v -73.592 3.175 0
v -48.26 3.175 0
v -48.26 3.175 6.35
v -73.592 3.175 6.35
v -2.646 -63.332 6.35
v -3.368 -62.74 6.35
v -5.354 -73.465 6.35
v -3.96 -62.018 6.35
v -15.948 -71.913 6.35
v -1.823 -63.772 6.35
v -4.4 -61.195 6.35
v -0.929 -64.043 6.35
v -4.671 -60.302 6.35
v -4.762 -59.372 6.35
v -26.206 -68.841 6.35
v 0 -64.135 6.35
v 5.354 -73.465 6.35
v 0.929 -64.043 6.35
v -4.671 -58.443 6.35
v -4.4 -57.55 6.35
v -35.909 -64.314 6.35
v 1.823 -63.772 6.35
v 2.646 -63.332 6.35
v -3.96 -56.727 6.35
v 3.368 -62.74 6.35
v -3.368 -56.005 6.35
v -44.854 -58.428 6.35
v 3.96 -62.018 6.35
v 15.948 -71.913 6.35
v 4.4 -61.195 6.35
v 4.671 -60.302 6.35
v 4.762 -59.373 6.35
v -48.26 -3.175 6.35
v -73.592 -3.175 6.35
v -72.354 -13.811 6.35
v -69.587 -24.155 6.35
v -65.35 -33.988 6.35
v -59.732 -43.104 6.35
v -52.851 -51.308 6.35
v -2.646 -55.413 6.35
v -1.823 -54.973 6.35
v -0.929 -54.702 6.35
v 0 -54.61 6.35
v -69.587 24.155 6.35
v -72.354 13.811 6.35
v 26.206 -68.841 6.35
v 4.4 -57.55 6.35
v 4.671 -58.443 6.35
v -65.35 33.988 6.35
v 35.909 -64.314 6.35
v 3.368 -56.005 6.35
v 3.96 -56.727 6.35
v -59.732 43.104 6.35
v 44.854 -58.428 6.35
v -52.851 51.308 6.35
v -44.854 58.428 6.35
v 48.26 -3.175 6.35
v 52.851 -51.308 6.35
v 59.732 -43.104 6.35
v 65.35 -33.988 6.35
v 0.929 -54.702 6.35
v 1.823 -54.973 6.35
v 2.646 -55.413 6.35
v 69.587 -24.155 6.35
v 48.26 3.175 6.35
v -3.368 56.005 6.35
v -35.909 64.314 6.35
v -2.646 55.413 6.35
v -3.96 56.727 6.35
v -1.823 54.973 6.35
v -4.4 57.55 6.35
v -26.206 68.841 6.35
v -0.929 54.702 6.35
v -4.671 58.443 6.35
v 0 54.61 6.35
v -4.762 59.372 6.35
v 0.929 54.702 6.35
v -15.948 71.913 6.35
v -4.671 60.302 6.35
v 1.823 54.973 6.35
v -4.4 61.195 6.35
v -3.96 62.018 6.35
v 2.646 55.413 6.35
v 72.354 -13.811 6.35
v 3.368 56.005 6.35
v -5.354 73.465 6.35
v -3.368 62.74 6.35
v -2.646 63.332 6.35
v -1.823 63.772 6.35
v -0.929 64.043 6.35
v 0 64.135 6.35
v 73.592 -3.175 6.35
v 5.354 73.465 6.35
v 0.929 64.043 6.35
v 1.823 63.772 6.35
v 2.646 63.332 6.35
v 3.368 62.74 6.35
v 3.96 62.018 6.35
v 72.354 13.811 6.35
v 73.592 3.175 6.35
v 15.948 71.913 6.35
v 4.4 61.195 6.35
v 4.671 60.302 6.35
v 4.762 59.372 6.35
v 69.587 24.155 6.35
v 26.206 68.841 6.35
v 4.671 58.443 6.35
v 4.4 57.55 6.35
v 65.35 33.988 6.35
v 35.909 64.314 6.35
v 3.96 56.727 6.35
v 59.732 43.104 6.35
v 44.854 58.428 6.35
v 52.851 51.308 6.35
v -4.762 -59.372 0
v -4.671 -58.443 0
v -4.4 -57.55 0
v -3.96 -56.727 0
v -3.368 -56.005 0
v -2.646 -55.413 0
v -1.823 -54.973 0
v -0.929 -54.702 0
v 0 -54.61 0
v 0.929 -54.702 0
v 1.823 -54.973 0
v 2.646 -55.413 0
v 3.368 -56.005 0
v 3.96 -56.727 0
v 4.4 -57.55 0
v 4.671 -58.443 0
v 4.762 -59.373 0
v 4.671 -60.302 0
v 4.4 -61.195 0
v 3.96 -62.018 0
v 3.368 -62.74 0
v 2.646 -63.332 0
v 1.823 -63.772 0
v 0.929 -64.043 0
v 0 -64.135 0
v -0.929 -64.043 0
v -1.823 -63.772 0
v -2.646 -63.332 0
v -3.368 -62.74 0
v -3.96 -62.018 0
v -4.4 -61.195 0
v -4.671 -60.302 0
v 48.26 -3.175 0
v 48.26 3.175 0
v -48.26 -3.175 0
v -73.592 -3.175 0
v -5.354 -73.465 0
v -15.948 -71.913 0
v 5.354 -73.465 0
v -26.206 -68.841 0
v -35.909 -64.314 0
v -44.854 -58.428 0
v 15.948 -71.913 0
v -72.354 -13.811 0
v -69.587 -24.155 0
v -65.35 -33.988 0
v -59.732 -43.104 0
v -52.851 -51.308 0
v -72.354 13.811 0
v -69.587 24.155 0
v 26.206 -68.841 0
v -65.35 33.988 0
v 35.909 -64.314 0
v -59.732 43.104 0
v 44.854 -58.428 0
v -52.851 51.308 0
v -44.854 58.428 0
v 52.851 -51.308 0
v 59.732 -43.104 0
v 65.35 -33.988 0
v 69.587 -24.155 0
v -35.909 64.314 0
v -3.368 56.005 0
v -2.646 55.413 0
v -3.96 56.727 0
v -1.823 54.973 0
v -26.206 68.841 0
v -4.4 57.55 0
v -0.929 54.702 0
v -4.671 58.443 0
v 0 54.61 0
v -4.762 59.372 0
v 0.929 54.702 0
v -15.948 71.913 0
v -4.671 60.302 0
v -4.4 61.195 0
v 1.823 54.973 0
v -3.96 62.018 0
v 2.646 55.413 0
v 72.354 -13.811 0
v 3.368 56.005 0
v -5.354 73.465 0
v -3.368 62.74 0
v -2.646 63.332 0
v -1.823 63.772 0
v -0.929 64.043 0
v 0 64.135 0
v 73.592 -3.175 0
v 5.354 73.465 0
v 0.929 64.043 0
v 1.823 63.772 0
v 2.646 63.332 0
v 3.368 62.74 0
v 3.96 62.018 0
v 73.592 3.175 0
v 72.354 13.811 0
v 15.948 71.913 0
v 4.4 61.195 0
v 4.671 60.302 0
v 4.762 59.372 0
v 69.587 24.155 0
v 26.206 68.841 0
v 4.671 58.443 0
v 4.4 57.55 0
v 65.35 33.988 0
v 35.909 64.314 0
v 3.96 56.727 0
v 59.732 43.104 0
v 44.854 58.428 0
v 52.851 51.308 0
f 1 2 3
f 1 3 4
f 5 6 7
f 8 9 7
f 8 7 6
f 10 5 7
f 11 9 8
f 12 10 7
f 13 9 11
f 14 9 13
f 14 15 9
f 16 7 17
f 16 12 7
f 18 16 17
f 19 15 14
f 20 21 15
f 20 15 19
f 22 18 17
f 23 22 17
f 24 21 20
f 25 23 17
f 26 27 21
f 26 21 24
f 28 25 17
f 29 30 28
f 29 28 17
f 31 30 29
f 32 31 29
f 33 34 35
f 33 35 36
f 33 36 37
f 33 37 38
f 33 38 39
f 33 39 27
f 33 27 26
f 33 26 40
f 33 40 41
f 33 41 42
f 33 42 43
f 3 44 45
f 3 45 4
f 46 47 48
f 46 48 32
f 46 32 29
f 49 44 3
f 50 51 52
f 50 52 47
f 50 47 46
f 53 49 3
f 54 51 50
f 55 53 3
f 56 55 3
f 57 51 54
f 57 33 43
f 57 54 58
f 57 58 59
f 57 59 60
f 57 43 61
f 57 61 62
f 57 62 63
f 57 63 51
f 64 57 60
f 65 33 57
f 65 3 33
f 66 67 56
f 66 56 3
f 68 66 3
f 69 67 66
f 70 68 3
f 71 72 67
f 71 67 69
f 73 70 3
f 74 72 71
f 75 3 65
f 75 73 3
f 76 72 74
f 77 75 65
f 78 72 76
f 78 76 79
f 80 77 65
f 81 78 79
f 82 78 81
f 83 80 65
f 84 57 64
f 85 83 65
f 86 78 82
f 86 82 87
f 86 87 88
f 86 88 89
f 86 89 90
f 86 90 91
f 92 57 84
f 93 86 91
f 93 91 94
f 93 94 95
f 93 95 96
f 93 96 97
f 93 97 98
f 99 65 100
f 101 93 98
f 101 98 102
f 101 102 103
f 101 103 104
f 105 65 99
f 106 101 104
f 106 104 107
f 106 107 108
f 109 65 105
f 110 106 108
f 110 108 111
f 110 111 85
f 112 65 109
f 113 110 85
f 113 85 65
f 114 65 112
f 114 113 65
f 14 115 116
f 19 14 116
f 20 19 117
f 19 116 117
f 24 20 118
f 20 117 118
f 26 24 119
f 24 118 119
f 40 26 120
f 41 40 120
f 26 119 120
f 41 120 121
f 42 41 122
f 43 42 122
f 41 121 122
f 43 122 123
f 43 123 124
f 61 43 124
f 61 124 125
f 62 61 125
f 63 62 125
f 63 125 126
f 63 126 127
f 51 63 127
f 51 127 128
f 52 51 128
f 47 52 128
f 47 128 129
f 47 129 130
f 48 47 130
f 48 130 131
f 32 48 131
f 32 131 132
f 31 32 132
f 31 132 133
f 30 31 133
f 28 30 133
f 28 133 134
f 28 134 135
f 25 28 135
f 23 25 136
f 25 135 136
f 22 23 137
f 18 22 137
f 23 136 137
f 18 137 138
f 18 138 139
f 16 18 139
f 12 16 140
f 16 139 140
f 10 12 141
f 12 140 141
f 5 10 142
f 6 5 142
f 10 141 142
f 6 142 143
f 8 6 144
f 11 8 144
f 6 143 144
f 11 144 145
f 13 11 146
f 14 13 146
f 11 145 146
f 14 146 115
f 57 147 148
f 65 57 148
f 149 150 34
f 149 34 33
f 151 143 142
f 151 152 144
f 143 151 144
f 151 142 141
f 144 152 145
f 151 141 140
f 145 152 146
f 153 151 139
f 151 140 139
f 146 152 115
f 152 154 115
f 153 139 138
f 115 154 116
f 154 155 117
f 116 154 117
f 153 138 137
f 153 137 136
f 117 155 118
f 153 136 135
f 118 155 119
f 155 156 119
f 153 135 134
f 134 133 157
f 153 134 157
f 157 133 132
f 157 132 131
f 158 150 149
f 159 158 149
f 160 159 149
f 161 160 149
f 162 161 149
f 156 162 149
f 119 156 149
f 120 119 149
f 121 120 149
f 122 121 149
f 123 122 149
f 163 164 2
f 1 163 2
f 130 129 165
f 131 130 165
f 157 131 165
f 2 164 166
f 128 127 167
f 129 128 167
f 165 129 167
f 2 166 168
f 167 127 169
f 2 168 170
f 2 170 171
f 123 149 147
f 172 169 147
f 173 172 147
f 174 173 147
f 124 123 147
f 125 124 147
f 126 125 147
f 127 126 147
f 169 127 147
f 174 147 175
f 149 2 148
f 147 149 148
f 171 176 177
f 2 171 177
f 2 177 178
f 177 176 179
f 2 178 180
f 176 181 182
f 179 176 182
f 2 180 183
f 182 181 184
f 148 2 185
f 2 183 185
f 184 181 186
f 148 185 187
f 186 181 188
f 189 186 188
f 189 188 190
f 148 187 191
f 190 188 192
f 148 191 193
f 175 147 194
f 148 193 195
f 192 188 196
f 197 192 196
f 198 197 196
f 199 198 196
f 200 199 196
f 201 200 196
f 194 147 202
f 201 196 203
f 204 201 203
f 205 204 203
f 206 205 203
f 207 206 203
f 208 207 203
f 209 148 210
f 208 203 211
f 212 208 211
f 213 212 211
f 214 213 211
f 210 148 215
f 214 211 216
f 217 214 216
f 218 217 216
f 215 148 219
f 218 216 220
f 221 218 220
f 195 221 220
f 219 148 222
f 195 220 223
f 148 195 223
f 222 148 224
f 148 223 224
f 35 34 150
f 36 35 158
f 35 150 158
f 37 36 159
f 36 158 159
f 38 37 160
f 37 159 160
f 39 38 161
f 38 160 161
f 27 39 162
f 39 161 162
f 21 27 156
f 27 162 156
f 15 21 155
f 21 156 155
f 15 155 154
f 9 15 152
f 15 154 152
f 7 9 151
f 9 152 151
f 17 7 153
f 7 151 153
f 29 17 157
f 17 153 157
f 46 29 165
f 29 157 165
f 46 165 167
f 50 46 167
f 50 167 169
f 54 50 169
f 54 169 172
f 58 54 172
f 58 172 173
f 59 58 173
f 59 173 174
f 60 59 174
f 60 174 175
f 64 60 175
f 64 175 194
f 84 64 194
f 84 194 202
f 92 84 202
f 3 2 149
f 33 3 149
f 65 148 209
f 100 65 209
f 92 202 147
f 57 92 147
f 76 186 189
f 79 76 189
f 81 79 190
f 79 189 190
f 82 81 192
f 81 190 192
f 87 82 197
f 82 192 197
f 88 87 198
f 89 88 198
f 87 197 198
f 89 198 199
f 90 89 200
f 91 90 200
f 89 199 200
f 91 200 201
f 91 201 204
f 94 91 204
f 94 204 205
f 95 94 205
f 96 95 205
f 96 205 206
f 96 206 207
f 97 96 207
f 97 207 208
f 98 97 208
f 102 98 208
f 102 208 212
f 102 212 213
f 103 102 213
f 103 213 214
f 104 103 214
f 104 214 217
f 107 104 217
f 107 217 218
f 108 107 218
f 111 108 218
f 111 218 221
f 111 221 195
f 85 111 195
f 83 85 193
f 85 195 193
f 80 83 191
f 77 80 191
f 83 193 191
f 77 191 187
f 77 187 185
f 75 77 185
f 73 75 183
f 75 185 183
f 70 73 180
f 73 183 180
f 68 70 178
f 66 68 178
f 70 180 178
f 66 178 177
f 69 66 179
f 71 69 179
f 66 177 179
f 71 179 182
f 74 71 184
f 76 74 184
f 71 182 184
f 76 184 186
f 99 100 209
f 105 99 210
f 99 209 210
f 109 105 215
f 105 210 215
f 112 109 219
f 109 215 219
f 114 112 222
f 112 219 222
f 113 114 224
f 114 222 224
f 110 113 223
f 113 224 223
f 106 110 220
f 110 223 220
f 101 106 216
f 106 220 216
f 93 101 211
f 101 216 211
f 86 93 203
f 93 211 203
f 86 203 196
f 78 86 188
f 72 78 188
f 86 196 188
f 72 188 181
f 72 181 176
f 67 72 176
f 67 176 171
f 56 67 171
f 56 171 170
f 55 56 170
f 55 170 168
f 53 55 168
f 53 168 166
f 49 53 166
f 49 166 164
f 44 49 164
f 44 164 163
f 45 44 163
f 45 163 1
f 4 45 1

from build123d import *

# Parameters (mm, degrees)
SKETCH1_R           = 73.66
BOSS_EXTRUDE1_DEPTH = 6.35
CUT_EXTRUDE1_DEPTH  = 7.35
SKETCH4_R           = 4.7625
CUT_EXTRUDE2_DEPTH  = 7.35


with BuildPart() as part:
    # Sketch1 → Boss-Extrude1 (new body)
    with BuildSketch(Plane.XY):
        Circle(SKETCH1_R)
    extrude(amount=BOSS_EXTRUDE1_DEPTH)

    # Sketch2 → Cut-Extrude1 (cut, through all)
    with BuildSketch(Plane(origin=(0, 0, 0), x_dir=(-1, 0, 0), z_dir=(0, 0, -1))):
        Polygon((-48.26, 0), (-48.26, 3.175), (-76.2, 3.175), (-76.2, -3.175), (-48.26, -3.175), align=None)
        Polygon((48.26, -3.175), (48.26, 0), (48.26, 3.175), (76.2, 3.175), (76.2, -3.175), align=None)
    extrude(amount=-CUT_EXTRUDE1_DEPTH, mode=Mode.SUBTRACT)

    # Sketch4 → Cut-Extrude2 (cut, through all)
    with BuildSketch(Plane(origin=(0, 0, 0), x_dir=(-1, 0, 0), z_dir=(0, 0, -1))):
        with Locations((0, -59.3725)):
            Circle(SKETCH4_R)
        with Locations((0, 59.3725)):
            Circle(SKETCH4_R)
    extrude(amount=-CUT_EXTRUDE2_DEPTH, mode=Mode.SUBTRACT)


solid = part.part
